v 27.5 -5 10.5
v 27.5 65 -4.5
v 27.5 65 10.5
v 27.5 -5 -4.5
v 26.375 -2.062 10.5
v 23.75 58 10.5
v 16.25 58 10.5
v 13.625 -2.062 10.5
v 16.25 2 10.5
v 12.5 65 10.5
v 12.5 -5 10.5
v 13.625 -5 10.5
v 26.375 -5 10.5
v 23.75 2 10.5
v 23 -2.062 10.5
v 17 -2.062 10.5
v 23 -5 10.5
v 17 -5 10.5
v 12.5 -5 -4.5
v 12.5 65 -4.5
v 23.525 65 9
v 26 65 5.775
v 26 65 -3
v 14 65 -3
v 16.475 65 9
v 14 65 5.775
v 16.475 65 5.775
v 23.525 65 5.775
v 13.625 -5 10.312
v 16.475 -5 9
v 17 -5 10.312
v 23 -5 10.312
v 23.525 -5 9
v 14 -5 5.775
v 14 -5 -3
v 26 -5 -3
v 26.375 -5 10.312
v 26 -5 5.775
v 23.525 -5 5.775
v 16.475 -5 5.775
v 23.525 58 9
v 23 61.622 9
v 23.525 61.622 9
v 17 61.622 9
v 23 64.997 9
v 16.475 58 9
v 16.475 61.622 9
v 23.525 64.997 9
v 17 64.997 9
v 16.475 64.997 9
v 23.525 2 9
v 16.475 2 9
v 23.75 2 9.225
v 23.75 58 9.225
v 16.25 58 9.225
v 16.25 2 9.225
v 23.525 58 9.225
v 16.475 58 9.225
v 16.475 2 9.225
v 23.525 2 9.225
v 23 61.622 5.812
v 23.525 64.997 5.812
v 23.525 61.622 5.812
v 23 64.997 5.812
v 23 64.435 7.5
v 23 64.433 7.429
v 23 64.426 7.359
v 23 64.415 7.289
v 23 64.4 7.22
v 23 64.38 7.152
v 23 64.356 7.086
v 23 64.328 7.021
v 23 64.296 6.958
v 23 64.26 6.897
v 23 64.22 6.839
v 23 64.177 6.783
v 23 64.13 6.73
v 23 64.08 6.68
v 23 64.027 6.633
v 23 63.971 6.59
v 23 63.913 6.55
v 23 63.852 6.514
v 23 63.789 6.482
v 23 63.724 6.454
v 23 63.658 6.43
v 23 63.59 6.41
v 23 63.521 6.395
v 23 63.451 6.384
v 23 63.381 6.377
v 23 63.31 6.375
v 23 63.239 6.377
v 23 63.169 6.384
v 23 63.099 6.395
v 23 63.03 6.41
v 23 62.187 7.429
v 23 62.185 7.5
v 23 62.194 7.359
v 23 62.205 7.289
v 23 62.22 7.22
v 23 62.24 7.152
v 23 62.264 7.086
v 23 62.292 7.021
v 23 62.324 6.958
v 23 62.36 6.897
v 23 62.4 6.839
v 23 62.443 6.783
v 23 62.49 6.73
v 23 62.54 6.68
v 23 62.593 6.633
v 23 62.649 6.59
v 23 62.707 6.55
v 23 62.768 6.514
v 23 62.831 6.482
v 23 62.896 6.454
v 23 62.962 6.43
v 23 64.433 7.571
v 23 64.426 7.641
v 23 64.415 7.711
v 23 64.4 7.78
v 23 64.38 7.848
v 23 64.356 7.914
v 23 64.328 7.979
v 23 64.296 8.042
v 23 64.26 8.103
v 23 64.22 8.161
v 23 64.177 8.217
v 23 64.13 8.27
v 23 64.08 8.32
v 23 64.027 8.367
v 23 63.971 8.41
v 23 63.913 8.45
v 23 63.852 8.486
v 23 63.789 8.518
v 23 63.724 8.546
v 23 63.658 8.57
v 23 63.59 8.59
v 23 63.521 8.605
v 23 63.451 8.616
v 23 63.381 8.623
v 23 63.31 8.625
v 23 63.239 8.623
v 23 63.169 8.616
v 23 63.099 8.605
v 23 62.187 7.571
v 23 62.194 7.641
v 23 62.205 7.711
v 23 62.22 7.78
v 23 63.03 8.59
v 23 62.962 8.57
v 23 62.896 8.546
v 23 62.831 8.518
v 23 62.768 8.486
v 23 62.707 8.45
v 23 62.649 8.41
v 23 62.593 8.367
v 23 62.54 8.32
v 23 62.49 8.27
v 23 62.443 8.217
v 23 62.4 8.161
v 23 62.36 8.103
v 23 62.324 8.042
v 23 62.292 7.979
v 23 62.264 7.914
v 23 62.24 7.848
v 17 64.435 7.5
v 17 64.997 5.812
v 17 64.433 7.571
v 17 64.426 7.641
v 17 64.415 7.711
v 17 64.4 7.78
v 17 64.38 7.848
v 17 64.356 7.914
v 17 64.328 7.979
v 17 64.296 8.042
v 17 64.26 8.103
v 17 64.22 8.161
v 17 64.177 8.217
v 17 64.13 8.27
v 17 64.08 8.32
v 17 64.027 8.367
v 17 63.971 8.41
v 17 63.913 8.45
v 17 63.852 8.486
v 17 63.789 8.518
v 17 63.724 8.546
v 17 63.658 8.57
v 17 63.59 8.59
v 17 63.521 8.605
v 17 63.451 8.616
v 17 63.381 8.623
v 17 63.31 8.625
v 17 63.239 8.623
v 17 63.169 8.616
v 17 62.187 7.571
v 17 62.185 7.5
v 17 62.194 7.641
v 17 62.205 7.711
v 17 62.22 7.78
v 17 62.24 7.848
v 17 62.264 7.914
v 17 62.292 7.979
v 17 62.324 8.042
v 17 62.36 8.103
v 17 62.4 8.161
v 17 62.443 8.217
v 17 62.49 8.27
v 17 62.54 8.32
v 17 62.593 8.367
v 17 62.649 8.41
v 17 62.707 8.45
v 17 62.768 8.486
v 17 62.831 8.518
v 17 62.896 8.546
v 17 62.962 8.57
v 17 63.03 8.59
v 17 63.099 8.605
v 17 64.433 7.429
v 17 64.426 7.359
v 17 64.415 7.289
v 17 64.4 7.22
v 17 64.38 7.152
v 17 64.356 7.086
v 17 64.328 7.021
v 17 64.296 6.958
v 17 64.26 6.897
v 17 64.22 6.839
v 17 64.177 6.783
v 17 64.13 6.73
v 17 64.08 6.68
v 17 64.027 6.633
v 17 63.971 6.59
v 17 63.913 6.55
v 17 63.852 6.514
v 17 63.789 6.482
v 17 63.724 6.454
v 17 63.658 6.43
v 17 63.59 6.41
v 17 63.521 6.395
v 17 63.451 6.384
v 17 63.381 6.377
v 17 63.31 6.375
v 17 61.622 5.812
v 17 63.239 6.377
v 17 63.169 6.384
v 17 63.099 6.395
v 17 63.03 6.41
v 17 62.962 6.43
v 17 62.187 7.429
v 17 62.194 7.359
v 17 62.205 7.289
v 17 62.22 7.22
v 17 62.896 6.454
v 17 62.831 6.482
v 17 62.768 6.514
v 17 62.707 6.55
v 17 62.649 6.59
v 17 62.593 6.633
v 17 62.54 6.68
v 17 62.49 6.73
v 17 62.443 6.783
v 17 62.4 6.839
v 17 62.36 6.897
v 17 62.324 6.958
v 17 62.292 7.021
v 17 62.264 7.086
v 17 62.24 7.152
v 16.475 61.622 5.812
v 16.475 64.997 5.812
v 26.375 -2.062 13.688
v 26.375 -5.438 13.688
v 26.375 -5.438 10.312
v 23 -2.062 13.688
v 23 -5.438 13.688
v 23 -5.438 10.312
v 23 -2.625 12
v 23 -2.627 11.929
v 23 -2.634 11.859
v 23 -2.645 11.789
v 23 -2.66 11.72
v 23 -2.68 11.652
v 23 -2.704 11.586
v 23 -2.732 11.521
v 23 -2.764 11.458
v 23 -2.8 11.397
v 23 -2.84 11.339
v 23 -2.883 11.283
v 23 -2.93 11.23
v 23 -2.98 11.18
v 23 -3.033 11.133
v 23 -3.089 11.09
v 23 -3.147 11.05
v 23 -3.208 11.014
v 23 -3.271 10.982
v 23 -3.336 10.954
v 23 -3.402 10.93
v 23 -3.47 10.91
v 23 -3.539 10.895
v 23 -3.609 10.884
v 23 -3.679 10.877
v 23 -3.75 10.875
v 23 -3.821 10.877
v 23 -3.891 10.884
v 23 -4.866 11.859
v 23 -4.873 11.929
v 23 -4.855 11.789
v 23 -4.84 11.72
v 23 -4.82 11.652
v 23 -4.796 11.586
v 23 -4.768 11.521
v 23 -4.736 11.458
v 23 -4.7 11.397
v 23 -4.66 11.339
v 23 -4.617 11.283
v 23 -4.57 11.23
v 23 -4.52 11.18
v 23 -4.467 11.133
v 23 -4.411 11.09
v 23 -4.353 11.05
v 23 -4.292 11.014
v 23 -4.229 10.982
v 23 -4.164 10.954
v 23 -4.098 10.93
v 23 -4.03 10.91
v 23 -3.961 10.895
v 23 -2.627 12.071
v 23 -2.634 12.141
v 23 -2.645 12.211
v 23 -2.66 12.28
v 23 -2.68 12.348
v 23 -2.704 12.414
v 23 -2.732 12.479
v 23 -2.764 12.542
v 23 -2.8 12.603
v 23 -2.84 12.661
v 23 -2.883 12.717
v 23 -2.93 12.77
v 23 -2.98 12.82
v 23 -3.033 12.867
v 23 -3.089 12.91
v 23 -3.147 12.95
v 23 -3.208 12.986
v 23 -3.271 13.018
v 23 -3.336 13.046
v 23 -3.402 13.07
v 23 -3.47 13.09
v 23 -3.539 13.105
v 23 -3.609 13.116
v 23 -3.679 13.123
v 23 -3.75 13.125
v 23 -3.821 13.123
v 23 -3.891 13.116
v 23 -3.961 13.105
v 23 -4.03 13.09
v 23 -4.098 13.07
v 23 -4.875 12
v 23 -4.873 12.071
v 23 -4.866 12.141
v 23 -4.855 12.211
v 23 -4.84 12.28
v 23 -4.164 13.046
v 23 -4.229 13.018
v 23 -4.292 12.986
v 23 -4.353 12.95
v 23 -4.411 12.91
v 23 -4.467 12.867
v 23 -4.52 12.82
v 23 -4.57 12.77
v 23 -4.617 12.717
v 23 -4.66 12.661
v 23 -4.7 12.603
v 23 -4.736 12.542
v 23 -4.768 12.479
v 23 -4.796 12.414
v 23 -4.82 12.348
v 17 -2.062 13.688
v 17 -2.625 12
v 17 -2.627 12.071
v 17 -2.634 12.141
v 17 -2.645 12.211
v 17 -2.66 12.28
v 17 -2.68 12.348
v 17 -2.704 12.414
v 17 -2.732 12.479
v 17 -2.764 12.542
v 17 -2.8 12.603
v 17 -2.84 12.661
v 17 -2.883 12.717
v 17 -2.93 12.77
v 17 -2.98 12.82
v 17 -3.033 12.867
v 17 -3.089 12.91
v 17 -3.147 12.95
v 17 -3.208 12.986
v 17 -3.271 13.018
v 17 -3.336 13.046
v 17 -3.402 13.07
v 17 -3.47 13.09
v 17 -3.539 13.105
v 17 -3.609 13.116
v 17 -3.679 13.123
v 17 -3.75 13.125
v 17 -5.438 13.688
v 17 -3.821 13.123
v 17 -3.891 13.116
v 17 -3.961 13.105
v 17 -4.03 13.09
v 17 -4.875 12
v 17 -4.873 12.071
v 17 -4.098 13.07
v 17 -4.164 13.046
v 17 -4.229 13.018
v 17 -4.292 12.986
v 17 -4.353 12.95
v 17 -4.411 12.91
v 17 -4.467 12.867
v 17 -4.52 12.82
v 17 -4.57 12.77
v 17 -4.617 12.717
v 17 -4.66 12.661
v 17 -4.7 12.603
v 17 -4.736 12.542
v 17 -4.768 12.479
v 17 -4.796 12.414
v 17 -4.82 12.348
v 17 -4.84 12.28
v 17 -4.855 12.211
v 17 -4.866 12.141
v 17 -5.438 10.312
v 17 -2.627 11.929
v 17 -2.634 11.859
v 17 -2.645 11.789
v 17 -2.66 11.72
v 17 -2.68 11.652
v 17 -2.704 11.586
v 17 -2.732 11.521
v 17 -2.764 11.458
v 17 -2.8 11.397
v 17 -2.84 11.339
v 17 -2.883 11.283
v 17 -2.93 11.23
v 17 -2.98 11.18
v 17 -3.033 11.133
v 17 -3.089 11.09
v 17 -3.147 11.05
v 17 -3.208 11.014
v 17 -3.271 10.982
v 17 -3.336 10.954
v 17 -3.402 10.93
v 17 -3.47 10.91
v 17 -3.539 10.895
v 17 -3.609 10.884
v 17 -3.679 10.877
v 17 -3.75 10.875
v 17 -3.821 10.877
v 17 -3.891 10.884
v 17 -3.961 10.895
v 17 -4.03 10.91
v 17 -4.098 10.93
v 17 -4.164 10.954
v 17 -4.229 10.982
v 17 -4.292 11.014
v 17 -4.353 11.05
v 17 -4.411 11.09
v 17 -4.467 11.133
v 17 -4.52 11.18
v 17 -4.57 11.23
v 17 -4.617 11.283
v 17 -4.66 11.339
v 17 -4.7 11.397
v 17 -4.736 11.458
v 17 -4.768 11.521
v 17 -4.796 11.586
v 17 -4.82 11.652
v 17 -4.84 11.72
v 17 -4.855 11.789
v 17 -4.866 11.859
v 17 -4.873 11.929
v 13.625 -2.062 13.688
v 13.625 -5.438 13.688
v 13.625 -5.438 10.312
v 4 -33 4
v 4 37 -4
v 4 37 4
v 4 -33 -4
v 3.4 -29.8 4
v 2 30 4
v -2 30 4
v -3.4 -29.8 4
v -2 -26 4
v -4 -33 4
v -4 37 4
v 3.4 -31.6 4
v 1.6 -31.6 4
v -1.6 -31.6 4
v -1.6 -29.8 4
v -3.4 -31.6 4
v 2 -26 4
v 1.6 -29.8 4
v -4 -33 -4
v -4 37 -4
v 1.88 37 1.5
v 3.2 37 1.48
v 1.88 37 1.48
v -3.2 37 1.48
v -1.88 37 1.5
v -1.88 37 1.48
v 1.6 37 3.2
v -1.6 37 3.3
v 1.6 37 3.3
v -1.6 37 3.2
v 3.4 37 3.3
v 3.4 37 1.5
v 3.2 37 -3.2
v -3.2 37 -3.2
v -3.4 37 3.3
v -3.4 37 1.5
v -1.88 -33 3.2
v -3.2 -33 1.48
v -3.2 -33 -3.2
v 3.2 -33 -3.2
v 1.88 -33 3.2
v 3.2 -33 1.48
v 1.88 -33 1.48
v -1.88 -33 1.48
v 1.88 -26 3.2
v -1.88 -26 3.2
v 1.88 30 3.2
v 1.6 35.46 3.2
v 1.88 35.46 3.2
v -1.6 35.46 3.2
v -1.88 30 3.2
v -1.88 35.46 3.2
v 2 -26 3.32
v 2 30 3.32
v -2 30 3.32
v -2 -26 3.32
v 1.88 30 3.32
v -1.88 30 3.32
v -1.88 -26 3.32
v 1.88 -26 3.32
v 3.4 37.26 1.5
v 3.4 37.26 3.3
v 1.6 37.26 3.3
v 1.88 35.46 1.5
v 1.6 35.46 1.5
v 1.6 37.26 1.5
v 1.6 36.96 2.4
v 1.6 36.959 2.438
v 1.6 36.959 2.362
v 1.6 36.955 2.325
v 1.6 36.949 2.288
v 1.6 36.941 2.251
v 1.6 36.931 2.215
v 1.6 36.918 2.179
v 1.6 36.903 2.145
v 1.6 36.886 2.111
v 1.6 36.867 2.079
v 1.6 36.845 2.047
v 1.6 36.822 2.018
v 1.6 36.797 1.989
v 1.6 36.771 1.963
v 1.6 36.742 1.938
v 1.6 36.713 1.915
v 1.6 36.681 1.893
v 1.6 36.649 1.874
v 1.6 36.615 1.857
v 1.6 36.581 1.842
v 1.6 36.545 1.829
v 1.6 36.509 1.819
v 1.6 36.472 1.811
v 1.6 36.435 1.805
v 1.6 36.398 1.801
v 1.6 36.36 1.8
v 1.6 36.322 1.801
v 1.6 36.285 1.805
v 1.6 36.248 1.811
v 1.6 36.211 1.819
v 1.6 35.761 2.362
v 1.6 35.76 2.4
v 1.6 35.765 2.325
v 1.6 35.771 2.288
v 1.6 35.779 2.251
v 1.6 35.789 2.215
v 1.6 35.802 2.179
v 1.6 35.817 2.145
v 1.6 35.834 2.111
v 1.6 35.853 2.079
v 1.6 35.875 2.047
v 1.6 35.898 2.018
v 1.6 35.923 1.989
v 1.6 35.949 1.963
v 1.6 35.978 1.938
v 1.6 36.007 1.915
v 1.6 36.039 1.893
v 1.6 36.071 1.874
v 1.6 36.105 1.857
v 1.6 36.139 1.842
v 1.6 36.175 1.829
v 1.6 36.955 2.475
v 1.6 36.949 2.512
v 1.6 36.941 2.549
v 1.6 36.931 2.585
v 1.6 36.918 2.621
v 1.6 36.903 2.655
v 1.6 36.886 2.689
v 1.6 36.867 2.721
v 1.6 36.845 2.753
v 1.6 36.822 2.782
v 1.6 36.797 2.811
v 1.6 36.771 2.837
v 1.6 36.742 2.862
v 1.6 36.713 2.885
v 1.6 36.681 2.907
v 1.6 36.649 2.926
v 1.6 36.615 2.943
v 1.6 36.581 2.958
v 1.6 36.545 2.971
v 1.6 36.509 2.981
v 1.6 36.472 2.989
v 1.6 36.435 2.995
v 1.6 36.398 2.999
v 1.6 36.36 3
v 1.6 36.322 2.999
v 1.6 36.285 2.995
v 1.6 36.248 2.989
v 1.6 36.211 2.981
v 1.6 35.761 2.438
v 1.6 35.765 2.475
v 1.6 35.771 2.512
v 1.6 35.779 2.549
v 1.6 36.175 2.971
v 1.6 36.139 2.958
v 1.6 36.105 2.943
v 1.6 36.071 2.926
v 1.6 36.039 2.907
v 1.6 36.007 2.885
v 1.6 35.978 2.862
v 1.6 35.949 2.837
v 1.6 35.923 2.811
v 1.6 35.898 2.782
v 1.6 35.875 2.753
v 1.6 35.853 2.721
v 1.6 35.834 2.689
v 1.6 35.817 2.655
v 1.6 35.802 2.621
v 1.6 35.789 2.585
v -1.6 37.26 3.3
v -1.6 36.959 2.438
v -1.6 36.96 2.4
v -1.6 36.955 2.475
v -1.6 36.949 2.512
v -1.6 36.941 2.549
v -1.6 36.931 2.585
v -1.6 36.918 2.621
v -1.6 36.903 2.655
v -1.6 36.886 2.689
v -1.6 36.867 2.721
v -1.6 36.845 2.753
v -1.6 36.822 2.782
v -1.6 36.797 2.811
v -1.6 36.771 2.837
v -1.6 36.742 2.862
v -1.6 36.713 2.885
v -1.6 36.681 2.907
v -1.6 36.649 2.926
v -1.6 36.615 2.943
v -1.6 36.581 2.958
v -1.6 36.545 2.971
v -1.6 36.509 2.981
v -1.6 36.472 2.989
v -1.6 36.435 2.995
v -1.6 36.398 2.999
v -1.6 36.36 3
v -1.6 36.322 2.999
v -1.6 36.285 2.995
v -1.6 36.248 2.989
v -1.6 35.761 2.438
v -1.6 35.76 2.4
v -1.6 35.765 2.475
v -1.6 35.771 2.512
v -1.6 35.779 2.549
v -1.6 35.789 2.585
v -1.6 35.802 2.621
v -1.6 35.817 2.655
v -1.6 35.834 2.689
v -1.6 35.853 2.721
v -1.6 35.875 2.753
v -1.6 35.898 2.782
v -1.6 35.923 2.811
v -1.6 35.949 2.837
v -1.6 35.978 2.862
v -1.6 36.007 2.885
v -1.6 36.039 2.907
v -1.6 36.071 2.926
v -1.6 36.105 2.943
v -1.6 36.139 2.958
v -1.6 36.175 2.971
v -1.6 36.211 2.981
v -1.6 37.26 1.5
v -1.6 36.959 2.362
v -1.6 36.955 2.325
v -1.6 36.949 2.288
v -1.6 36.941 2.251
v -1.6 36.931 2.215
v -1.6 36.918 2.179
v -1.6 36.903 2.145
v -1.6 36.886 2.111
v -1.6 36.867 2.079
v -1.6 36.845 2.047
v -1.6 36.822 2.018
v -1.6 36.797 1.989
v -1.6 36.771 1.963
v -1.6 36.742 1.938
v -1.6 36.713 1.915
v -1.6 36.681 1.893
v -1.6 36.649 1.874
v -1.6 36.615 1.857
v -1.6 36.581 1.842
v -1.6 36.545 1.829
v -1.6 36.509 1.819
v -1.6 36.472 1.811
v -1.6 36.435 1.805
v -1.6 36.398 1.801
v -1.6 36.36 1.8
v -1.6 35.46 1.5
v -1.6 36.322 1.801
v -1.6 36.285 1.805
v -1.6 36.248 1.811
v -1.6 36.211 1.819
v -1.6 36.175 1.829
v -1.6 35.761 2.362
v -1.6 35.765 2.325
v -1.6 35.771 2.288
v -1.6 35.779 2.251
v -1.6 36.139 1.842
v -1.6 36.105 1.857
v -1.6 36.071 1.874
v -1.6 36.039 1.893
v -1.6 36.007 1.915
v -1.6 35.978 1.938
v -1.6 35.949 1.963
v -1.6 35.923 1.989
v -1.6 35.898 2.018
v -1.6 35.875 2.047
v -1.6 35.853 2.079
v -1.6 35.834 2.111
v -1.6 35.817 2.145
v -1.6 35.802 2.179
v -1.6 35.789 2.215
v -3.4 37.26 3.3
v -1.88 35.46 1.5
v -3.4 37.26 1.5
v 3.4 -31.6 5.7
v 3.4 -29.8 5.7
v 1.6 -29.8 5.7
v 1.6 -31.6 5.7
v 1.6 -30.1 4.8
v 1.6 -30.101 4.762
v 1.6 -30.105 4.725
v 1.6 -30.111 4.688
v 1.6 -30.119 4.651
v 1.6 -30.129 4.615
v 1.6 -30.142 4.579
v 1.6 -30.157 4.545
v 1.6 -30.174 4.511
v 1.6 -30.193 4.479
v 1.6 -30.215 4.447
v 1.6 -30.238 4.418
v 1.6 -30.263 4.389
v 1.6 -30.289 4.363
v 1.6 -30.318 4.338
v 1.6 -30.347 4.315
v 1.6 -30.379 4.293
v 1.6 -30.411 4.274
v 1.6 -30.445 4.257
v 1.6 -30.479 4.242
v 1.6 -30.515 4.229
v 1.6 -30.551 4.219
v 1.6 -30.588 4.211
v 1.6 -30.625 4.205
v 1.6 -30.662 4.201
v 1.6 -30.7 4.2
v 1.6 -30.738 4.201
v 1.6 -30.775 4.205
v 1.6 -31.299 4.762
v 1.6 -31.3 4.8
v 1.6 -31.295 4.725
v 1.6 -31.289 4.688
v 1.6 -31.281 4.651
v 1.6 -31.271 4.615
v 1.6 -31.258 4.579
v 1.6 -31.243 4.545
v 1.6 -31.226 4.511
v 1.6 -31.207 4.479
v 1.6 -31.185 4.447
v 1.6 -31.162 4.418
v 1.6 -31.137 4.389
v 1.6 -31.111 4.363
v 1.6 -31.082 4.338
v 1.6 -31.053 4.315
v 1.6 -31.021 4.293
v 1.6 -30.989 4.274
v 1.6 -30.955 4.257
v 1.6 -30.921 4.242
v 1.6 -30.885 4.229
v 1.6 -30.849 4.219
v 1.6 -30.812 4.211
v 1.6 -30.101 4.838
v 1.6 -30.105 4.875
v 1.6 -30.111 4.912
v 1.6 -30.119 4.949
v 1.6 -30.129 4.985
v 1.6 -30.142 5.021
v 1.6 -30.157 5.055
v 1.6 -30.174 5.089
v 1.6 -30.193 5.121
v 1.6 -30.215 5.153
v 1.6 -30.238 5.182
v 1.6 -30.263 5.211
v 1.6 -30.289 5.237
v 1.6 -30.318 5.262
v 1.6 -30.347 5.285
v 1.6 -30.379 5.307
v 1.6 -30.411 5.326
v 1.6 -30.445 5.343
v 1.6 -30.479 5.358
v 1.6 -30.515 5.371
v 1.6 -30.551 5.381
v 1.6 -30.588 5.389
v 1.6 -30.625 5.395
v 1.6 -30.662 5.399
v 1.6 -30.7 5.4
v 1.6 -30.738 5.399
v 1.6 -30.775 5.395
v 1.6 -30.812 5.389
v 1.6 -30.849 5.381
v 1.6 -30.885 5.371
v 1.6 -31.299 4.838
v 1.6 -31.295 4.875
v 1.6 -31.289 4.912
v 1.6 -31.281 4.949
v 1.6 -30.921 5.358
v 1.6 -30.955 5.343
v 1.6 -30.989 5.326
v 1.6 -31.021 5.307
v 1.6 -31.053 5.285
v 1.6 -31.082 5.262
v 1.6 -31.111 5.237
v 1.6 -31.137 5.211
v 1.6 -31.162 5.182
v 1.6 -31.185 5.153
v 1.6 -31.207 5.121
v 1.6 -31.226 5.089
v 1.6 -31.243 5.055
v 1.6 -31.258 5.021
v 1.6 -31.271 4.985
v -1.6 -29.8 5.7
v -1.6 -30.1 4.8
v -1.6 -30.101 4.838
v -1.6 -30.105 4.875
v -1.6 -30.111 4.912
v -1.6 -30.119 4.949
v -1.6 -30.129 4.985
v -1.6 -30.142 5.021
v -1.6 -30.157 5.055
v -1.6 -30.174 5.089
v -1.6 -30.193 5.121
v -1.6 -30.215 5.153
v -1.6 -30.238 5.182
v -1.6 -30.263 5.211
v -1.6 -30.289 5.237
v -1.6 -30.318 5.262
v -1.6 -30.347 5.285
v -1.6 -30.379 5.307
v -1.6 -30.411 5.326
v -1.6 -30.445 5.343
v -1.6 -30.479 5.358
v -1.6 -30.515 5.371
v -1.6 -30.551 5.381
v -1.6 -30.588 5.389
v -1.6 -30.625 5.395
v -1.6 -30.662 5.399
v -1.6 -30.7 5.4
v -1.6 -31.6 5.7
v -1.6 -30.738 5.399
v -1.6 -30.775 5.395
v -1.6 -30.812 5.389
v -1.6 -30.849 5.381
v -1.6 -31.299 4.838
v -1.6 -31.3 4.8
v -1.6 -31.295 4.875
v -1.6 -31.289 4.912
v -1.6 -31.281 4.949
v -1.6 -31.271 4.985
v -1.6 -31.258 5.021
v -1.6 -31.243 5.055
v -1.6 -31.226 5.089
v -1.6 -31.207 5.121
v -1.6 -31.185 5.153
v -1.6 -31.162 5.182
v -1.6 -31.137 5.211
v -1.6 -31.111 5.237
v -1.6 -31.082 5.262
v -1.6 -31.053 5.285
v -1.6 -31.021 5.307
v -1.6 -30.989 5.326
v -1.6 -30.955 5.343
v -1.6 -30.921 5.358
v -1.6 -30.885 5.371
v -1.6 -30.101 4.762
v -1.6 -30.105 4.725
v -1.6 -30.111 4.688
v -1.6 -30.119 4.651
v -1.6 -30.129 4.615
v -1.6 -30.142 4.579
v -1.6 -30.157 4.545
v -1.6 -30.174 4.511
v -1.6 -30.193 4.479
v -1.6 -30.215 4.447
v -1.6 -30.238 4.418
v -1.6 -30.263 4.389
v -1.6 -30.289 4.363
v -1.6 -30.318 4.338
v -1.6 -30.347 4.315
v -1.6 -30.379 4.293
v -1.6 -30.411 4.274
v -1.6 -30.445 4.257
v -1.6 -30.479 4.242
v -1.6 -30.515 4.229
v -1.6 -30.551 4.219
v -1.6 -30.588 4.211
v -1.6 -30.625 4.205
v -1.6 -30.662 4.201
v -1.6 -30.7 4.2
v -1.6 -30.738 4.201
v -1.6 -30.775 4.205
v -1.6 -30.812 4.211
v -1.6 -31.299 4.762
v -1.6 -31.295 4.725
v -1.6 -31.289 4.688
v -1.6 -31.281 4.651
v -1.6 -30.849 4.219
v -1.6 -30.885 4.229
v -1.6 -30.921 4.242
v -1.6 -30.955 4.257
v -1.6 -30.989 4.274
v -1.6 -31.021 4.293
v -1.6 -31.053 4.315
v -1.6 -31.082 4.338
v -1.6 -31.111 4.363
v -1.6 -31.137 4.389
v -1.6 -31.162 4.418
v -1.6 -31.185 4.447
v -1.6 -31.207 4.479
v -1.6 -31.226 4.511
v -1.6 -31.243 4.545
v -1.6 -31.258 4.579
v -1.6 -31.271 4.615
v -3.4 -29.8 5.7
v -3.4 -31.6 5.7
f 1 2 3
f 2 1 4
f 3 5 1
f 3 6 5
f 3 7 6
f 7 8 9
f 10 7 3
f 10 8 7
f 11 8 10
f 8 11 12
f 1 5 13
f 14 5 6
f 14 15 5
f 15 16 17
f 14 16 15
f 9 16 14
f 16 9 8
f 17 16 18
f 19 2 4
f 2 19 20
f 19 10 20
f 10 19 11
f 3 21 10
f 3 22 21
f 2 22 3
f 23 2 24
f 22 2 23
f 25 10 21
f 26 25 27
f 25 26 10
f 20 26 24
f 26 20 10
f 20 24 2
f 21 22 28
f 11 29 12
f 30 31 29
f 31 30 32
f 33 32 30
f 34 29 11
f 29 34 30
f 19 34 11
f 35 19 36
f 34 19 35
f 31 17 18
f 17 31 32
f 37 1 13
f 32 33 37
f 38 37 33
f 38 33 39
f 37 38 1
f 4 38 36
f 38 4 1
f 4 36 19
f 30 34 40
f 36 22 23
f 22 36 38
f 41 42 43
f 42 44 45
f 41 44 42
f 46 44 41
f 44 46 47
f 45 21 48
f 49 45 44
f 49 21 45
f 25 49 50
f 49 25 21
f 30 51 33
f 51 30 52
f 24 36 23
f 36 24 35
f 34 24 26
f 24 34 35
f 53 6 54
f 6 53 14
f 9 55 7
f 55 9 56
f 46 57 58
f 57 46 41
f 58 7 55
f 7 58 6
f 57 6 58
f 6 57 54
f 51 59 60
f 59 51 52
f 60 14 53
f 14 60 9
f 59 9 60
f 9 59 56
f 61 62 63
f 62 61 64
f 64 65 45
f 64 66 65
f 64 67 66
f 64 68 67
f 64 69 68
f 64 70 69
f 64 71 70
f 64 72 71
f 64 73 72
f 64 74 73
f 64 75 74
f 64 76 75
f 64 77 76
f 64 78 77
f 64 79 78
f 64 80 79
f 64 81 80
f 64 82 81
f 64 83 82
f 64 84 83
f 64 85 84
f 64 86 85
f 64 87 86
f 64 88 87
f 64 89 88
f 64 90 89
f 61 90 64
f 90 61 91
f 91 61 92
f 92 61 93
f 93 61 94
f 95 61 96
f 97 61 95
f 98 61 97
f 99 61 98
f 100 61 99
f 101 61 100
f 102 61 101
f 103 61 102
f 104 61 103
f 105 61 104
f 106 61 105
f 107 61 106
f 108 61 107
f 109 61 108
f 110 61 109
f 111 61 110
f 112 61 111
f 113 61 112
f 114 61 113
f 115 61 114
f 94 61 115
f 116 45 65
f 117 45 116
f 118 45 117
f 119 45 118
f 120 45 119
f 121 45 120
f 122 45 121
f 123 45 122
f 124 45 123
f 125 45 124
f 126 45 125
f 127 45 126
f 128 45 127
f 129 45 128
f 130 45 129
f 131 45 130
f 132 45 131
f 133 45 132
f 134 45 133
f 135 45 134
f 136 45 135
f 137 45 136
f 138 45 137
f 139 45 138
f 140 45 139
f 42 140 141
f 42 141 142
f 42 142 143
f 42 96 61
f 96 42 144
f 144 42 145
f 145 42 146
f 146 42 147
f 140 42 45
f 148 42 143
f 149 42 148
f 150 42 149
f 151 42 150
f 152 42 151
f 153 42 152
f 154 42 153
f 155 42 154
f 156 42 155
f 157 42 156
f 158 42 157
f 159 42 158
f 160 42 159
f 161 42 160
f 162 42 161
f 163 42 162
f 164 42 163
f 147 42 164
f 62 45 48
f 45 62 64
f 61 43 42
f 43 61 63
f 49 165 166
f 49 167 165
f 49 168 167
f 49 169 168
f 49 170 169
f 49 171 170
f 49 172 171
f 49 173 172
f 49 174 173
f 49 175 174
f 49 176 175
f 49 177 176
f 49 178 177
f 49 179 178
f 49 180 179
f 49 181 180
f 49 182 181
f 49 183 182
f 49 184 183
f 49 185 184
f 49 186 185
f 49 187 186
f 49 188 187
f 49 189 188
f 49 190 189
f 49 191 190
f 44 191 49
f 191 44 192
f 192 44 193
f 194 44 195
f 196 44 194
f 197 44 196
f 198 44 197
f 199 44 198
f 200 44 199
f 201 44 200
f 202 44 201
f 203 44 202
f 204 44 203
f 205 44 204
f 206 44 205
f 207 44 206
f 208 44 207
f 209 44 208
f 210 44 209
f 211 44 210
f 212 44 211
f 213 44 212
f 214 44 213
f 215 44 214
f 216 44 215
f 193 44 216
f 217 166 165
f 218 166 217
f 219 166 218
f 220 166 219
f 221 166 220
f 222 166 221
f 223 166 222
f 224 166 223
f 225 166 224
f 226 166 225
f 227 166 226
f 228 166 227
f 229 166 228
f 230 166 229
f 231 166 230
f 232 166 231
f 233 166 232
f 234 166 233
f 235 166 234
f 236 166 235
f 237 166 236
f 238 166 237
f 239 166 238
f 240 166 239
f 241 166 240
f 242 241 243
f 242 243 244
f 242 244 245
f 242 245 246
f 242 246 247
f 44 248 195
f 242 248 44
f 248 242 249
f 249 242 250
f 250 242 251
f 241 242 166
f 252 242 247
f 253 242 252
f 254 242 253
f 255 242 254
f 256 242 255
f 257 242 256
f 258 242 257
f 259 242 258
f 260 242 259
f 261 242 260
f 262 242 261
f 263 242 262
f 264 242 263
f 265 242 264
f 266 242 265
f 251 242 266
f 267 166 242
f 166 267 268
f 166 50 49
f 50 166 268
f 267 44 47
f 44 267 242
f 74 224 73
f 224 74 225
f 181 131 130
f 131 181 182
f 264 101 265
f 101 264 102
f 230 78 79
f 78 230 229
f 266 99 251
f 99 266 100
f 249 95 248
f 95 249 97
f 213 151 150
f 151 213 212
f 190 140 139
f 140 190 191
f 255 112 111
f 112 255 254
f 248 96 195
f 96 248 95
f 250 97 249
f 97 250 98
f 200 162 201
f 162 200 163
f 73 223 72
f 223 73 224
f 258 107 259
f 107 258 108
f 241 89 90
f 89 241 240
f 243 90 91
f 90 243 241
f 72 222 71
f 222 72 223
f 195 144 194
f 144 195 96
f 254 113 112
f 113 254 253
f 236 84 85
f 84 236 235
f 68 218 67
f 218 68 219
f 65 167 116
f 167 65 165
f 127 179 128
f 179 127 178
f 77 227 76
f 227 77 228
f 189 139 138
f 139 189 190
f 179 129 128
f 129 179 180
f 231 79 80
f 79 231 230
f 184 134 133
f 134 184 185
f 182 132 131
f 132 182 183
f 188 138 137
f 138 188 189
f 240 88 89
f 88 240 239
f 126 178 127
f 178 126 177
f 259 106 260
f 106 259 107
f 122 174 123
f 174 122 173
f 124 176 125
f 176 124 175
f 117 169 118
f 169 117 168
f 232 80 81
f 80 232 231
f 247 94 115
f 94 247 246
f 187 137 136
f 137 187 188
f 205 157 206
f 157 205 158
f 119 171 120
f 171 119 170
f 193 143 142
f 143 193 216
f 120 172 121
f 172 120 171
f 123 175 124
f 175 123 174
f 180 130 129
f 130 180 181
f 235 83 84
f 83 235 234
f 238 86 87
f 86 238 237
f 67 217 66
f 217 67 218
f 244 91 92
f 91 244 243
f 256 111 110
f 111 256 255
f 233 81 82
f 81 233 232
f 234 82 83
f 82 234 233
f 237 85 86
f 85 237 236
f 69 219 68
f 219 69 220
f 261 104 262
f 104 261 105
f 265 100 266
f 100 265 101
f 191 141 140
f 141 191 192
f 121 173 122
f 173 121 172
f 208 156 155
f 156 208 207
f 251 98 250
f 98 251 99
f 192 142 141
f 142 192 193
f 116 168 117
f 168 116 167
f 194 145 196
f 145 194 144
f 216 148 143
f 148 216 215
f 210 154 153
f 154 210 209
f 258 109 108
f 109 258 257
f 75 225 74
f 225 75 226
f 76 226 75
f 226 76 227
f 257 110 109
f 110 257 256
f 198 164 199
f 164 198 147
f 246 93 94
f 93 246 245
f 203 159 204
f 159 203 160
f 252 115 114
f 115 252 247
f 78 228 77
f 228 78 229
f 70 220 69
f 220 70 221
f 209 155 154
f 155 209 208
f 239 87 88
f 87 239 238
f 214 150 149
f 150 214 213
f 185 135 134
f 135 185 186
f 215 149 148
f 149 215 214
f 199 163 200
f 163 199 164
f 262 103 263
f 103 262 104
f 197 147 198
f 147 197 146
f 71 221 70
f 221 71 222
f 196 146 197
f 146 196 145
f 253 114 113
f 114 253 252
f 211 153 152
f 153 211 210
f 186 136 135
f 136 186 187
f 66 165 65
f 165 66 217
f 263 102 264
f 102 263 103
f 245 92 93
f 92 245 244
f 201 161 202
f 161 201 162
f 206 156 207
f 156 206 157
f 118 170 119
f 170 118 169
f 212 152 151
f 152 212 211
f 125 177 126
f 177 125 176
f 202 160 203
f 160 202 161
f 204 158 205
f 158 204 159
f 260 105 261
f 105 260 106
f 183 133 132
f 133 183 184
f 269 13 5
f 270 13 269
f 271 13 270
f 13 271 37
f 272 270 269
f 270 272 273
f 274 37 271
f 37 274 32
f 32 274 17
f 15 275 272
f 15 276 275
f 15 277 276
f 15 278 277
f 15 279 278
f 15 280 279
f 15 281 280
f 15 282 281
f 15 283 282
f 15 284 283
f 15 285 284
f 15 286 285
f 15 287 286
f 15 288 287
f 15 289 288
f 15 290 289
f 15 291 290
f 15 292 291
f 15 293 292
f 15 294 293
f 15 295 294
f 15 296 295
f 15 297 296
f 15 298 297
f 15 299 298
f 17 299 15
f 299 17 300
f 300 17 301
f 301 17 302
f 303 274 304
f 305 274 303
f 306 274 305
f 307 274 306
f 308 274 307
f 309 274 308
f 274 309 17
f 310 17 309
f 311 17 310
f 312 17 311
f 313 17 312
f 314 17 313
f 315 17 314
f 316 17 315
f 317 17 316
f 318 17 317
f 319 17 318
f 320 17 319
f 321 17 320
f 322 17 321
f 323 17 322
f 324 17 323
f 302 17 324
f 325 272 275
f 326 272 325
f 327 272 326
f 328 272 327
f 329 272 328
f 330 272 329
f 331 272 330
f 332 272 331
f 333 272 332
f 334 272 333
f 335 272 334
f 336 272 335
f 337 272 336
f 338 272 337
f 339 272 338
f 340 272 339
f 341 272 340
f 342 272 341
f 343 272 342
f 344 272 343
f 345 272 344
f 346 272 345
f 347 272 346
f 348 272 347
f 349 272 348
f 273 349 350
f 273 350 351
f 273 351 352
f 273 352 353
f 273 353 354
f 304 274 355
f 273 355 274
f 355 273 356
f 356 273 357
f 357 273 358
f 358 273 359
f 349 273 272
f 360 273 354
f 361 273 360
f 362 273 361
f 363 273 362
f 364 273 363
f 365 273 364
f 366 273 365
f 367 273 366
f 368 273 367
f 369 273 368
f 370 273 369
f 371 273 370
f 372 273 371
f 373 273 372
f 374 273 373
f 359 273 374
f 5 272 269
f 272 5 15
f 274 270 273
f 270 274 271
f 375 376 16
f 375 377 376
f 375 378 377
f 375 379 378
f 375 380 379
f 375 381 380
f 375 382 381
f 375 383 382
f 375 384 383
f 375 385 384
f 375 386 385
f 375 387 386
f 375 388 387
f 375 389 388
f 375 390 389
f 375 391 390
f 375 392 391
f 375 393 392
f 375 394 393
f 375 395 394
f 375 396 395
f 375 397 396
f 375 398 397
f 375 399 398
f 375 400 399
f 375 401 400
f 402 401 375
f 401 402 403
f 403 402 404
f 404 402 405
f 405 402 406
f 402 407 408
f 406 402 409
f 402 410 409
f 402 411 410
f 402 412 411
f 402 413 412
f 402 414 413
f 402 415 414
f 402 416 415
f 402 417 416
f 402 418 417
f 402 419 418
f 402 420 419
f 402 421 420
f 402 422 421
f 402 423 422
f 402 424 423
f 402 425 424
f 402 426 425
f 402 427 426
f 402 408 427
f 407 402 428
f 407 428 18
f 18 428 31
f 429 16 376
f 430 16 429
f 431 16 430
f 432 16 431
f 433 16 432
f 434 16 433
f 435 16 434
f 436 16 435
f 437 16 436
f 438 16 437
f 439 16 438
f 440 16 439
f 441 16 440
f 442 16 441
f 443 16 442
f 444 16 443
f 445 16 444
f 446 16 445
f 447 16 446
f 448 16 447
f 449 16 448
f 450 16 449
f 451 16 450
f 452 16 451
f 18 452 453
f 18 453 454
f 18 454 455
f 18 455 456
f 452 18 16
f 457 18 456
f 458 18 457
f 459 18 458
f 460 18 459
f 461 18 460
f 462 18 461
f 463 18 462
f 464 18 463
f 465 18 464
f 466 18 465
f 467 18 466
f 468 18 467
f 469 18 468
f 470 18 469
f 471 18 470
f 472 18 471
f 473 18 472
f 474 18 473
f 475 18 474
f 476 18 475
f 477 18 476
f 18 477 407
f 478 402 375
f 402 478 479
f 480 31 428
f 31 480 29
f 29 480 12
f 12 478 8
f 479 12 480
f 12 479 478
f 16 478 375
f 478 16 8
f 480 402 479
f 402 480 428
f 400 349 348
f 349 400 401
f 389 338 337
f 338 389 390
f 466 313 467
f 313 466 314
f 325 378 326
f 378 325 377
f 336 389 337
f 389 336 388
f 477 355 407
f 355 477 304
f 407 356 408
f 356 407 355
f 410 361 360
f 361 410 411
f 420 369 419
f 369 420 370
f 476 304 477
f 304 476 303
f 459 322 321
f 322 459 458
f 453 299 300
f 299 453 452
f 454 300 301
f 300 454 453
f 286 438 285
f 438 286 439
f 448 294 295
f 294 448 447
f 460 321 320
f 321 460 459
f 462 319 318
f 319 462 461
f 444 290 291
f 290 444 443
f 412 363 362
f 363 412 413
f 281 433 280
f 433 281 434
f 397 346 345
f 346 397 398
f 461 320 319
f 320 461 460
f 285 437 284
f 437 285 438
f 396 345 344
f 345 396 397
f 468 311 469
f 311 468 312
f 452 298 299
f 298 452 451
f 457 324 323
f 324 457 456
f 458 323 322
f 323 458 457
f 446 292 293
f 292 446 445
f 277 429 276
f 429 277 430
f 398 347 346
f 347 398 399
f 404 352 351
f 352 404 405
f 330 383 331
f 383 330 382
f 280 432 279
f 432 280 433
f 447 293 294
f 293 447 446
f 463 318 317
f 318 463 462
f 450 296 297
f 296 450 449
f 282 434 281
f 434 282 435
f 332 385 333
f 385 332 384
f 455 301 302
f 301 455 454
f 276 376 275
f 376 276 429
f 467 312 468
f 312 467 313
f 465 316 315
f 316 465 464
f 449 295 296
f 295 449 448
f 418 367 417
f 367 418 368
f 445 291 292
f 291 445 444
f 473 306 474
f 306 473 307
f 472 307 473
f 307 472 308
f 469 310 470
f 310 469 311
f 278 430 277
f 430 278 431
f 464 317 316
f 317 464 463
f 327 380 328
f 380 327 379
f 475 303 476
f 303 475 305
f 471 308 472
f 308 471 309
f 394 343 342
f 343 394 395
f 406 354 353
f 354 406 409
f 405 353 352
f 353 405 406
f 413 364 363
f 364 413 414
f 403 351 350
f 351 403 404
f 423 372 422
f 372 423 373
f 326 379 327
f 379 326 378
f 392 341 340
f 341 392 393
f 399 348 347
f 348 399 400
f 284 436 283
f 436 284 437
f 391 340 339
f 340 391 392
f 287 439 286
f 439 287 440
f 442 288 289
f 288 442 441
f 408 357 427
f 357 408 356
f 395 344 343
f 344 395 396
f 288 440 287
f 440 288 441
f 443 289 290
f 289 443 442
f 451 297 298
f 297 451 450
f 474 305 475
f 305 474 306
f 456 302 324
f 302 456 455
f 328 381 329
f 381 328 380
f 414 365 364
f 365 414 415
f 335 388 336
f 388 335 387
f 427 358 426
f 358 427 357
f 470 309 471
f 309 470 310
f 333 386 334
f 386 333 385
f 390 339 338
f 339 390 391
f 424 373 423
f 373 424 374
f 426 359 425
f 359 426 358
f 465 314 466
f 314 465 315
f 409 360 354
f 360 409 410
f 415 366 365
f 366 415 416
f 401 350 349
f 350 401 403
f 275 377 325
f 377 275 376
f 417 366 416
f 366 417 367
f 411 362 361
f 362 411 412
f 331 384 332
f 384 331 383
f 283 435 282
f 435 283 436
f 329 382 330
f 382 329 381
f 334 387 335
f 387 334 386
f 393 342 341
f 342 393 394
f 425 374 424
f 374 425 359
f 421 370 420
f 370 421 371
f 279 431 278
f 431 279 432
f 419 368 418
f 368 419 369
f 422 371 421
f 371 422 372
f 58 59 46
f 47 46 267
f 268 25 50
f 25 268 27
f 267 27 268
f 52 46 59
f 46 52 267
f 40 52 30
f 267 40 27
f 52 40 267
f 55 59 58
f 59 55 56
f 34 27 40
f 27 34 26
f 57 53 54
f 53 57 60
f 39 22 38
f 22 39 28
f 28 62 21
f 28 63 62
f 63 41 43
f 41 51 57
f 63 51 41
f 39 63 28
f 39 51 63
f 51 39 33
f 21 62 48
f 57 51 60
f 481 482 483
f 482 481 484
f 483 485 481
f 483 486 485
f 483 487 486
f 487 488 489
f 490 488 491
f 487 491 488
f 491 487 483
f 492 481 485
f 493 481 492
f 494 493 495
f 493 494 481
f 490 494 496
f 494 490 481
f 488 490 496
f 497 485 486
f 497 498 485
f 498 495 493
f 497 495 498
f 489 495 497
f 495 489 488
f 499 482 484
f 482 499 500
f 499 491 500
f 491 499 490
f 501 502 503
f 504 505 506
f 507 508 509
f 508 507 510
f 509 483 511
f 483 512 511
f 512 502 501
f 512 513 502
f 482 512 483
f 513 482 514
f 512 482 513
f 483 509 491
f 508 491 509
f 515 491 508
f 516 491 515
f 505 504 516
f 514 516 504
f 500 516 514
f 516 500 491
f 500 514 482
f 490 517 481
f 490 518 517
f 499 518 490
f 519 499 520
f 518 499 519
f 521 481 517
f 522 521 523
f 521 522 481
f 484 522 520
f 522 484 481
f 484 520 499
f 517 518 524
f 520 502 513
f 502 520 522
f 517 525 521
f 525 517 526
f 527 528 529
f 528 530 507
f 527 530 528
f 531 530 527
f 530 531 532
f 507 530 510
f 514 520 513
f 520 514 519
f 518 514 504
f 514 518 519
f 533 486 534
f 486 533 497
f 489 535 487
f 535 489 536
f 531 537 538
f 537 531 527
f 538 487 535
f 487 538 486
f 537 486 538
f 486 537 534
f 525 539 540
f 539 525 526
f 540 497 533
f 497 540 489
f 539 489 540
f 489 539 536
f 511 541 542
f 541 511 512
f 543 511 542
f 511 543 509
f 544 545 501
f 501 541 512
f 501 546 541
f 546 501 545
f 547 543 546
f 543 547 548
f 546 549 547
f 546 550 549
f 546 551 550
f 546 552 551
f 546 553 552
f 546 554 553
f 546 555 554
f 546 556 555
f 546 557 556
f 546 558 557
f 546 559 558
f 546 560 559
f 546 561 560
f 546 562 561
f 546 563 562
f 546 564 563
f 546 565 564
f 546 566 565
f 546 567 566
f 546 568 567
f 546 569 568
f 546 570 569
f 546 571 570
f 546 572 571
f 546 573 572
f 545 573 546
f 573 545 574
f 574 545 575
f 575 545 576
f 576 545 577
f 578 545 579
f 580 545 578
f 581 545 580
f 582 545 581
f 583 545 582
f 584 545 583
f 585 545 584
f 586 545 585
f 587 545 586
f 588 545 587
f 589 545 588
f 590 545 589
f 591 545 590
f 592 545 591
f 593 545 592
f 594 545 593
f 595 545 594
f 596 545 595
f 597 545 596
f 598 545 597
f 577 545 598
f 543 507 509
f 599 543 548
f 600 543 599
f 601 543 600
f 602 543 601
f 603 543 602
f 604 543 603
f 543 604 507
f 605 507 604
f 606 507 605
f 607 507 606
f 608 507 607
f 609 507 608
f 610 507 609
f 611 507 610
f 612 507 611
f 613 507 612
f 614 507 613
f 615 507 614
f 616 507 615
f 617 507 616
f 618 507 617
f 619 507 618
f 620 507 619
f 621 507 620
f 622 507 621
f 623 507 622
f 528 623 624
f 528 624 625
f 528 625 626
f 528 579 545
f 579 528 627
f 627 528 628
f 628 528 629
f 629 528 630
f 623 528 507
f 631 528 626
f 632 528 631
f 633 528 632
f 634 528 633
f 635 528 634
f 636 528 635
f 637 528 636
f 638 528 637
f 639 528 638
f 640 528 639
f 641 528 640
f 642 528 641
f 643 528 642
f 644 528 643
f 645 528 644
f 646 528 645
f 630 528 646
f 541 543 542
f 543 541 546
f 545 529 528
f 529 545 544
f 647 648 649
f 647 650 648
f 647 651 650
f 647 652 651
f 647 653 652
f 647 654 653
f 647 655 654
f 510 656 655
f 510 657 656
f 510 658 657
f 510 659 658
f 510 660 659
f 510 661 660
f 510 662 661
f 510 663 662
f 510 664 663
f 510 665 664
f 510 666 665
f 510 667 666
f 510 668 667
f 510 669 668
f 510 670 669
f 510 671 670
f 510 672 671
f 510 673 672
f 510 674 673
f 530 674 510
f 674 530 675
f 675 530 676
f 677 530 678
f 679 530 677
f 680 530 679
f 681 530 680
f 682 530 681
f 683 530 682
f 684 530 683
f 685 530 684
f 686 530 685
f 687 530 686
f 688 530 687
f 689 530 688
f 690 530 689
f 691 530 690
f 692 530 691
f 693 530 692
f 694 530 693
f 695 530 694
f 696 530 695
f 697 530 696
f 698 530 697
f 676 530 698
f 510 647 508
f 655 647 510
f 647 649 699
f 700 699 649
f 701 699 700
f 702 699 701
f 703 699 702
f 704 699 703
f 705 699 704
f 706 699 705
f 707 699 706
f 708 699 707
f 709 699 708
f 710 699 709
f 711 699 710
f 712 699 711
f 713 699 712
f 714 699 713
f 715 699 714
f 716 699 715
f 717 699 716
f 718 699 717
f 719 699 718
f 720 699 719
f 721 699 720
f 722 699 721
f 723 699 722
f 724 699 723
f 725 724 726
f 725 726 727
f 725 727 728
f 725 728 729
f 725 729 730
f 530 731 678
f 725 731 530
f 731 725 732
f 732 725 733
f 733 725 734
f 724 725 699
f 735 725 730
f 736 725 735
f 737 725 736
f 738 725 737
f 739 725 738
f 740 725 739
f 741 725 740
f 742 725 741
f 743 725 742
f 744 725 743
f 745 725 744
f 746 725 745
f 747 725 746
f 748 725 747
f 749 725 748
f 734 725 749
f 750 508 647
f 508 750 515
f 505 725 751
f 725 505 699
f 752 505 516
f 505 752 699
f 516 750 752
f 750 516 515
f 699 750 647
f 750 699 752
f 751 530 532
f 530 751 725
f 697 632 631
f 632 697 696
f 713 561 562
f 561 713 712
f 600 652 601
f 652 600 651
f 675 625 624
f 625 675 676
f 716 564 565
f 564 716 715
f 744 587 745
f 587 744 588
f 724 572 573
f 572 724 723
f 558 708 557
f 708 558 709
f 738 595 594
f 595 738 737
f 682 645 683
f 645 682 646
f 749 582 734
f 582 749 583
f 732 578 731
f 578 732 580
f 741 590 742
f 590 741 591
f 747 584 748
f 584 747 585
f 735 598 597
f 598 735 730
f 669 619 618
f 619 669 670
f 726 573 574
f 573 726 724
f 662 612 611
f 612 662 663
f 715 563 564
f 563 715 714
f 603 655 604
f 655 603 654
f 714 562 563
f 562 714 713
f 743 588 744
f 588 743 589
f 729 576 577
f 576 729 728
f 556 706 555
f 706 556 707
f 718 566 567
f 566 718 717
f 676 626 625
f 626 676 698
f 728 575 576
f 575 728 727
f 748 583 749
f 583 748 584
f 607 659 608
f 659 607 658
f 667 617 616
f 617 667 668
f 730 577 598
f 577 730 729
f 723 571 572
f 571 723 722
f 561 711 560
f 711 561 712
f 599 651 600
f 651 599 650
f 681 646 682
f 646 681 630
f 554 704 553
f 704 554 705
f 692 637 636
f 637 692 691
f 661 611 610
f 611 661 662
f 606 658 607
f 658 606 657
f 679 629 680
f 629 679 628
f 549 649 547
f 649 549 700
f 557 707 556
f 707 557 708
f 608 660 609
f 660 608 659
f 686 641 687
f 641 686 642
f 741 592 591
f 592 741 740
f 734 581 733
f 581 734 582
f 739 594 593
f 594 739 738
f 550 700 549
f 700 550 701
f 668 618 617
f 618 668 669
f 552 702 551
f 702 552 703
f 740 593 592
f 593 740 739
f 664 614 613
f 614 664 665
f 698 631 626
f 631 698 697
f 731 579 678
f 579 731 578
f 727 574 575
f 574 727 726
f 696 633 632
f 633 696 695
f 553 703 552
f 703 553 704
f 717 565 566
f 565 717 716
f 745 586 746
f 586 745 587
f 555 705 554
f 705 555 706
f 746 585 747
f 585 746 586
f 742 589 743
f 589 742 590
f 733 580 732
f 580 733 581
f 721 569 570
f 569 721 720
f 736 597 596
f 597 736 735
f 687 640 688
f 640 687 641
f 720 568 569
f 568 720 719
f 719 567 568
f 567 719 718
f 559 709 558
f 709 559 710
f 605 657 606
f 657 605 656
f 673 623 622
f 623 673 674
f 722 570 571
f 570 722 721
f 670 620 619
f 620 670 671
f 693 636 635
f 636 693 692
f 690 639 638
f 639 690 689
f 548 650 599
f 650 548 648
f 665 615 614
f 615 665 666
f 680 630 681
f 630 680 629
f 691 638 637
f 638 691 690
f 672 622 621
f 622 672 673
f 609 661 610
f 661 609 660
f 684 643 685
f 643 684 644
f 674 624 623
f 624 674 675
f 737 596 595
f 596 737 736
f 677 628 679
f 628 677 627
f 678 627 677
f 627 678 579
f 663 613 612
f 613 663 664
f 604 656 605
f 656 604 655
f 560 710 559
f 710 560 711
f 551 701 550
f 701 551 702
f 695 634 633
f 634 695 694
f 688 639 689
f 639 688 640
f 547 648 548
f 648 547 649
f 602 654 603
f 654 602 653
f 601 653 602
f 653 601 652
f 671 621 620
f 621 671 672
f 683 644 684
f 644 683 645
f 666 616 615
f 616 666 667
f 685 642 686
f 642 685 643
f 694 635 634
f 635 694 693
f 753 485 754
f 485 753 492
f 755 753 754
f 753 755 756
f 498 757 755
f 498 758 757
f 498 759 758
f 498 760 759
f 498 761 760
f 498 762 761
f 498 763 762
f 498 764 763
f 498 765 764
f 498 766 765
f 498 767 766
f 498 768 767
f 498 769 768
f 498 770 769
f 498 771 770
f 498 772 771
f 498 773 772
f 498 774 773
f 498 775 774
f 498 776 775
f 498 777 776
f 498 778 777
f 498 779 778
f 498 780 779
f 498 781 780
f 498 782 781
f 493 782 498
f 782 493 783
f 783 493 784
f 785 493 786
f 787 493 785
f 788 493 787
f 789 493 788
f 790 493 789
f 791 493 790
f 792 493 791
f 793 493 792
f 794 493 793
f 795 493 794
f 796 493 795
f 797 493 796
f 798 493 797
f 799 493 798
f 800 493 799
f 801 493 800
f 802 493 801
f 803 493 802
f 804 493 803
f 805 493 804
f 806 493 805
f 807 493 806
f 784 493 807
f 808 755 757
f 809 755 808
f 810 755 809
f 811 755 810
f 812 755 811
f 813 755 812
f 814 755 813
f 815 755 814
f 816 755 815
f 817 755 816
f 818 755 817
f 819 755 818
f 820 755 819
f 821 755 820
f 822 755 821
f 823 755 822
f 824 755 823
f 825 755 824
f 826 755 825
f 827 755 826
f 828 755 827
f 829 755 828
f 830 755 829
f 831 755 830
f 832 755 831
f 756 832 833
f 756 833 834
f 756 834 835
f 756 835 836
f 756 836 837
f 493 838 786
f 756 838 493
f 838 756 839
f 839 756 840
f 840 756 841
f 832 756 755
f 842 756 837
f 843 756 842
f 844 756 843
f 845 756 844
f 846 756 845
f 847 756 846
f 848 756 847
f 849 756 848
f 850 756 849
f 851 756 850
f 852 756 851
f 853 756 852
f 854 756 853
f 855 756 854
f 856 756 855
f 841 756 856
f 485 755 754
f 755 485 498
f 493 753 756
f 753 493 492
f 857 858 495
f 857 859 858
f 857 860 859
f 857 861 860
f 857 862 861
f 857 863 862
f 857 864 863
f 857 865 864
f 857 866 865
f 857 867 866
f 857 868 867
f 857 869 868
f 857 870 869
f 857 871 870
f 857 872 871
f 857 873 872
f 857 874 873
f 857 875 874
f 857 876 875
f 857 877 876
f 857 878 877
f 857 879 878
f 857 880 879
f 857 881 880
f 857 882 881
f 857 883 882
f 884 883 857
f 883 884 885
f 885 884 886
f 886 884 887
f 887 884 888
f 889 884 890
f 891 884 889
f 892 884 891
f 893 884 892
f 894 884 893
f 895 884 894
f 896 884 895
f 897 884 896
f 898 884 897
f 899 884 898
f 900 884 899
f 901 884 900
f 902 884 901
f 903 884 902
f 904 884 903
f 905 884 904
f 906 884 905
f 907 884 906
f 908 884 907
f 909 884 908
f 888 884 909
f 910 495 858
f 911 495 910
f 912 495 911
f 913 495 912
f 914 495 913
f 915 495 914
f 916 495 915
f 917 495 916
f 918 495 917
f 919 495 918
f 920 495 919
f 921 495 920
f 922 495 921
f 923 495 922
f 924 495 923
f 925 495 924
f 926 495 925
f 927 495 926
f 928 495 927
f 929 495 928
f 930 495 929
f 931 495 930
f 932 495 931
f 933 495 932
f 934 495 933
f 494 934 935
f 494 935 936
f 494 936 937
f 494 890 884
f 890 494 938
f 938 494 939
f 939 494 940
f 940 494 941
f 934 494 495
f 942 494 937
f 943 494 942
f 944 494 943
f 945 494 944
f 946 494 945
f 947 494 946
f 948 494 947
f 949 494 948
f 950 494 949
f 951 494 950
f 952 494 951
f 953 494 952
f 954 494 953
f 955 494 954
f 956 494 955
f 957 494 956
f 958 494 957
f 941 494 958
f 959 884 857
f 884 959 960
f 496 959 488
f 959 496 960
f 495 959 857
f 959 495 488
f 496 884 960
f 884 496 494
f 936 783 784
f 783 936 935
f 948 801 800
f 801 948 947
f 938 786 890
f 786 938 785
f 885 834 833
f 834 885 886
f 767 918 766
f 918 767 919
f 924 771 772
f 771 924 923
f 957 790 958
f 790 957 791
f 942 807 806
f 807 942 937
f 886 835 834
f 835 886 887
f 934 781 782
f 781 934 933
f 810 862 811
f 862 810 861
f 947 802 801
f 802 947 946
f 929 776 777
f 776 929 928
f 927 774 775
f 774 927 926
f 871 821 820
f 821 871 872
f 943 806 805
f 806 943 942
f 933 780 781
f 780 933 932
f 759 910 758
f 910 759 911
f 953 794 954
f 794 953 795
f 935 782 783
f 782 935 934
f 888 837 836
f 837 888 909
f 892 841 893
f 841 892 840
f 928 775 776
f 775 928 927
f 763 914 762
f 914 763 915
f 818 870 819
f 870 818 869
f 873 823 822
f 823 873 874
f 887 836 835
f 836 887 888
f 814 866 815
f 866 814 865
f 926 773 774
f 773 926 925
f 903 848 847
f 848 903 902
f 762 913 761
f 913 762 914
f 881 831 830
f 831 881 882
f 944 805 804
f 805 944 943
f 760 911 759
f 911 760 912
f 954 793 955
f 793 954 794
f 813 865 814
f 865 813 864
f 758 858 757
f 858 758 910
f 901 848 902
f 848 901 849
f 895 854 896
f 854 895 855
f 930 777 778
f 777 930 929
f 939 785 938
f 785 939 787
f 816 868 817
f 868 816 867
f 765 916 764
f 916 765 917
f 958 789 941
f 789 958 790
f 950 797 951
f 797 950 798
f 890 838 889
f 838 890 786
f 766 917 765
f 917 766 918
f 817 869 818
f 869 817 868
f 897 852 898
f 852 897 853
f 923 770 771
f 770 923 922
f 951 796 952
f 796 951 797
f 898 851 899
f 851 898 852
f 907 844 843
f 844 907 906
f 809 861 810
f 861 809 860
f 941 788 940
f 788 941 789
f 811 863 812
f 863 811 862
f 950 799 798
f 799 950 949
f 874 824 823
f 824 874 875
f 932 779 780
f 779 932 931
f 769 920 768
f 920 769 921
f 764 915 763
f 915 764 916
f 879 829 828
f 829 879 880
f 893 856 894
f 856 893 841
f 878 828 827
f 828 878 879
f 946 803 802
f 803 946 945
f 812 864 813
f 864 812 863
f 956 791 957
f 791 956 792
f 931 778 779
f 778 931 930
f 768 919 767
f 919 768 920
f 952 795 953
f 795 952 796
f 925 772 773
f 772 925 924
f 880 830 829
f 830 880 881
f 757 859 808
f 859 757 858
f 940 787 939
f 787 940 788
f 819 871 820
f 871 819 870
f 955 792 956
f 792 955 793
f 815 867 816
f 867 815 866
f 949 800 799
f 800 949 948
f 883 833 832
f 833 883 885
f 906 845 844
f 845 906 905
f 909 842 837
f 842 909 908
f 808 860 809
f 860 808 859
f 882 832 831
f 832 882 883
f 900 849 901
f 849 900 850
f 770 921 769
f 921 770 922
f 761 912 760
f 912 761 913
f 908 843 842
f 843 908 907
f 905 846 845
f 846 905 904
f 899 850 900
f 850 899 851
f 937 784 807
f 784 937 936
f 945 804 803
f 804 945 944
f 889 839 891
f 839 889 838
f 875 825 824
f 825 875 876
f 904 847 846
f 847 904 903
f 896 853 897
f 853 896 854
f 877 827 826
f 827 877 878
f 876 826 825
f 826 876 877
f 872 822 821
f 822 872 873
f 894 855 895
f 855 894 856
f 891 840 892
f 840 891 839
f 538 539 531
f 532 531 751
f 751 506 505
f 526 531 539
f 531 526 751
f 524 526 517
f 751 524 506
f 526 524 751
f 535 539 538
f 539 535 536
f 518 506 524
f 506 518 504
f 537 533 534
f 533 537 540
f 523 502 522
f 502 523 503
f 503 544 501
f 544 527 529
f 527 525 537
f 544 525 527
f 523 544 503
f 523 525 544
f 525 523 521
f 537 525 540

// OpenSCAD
module roller(r, length, x, y, z){
        for(i=[0:1])let(
        box_size = r*1.5,
        dx = [1,-1][i]*(length/2 + box_size/2))
        translate([x+dx,y,z])cube(box_size, center=true);
    
    
        translate([x,y,z])rotate([0, 90, 0])cylinder(length,r=r*0.5,center=true, $fn=100);

}


module arm(size, length, x, y, z){
    
    difference(){
        translate([x,y,z])cube([size,length,size], center=true);
        translate([x,y,z])cube([size*0.8,length*2,size*0.8], center=true);
        translate([x,y,z+size/2])cube([size*0.5,length*0.8,size*0.8], center=true);
    }
    let(r=size*0.15,y = y+length/2-r,z=z+size/2-r-0.1*size/2)
    {
    roller(r, size*0.4, x, y+length*0.008, z);
    roller(r, size*0.4, x, y-length*0.95, z+size*0.3);
    }
    
    for(i=[0:1])let(dx = [-1,1][i]*0.7*size/2,y=y,z=z+0.6*size/2)
        translate([x+dx,y,z])cube([size*0.23,length,size*0.23], center=true);
    
    
}


arm(15,70,20,30,3);
arm(8,70,0,2,0);
//roller(5, 20, 5, 3, 10);
